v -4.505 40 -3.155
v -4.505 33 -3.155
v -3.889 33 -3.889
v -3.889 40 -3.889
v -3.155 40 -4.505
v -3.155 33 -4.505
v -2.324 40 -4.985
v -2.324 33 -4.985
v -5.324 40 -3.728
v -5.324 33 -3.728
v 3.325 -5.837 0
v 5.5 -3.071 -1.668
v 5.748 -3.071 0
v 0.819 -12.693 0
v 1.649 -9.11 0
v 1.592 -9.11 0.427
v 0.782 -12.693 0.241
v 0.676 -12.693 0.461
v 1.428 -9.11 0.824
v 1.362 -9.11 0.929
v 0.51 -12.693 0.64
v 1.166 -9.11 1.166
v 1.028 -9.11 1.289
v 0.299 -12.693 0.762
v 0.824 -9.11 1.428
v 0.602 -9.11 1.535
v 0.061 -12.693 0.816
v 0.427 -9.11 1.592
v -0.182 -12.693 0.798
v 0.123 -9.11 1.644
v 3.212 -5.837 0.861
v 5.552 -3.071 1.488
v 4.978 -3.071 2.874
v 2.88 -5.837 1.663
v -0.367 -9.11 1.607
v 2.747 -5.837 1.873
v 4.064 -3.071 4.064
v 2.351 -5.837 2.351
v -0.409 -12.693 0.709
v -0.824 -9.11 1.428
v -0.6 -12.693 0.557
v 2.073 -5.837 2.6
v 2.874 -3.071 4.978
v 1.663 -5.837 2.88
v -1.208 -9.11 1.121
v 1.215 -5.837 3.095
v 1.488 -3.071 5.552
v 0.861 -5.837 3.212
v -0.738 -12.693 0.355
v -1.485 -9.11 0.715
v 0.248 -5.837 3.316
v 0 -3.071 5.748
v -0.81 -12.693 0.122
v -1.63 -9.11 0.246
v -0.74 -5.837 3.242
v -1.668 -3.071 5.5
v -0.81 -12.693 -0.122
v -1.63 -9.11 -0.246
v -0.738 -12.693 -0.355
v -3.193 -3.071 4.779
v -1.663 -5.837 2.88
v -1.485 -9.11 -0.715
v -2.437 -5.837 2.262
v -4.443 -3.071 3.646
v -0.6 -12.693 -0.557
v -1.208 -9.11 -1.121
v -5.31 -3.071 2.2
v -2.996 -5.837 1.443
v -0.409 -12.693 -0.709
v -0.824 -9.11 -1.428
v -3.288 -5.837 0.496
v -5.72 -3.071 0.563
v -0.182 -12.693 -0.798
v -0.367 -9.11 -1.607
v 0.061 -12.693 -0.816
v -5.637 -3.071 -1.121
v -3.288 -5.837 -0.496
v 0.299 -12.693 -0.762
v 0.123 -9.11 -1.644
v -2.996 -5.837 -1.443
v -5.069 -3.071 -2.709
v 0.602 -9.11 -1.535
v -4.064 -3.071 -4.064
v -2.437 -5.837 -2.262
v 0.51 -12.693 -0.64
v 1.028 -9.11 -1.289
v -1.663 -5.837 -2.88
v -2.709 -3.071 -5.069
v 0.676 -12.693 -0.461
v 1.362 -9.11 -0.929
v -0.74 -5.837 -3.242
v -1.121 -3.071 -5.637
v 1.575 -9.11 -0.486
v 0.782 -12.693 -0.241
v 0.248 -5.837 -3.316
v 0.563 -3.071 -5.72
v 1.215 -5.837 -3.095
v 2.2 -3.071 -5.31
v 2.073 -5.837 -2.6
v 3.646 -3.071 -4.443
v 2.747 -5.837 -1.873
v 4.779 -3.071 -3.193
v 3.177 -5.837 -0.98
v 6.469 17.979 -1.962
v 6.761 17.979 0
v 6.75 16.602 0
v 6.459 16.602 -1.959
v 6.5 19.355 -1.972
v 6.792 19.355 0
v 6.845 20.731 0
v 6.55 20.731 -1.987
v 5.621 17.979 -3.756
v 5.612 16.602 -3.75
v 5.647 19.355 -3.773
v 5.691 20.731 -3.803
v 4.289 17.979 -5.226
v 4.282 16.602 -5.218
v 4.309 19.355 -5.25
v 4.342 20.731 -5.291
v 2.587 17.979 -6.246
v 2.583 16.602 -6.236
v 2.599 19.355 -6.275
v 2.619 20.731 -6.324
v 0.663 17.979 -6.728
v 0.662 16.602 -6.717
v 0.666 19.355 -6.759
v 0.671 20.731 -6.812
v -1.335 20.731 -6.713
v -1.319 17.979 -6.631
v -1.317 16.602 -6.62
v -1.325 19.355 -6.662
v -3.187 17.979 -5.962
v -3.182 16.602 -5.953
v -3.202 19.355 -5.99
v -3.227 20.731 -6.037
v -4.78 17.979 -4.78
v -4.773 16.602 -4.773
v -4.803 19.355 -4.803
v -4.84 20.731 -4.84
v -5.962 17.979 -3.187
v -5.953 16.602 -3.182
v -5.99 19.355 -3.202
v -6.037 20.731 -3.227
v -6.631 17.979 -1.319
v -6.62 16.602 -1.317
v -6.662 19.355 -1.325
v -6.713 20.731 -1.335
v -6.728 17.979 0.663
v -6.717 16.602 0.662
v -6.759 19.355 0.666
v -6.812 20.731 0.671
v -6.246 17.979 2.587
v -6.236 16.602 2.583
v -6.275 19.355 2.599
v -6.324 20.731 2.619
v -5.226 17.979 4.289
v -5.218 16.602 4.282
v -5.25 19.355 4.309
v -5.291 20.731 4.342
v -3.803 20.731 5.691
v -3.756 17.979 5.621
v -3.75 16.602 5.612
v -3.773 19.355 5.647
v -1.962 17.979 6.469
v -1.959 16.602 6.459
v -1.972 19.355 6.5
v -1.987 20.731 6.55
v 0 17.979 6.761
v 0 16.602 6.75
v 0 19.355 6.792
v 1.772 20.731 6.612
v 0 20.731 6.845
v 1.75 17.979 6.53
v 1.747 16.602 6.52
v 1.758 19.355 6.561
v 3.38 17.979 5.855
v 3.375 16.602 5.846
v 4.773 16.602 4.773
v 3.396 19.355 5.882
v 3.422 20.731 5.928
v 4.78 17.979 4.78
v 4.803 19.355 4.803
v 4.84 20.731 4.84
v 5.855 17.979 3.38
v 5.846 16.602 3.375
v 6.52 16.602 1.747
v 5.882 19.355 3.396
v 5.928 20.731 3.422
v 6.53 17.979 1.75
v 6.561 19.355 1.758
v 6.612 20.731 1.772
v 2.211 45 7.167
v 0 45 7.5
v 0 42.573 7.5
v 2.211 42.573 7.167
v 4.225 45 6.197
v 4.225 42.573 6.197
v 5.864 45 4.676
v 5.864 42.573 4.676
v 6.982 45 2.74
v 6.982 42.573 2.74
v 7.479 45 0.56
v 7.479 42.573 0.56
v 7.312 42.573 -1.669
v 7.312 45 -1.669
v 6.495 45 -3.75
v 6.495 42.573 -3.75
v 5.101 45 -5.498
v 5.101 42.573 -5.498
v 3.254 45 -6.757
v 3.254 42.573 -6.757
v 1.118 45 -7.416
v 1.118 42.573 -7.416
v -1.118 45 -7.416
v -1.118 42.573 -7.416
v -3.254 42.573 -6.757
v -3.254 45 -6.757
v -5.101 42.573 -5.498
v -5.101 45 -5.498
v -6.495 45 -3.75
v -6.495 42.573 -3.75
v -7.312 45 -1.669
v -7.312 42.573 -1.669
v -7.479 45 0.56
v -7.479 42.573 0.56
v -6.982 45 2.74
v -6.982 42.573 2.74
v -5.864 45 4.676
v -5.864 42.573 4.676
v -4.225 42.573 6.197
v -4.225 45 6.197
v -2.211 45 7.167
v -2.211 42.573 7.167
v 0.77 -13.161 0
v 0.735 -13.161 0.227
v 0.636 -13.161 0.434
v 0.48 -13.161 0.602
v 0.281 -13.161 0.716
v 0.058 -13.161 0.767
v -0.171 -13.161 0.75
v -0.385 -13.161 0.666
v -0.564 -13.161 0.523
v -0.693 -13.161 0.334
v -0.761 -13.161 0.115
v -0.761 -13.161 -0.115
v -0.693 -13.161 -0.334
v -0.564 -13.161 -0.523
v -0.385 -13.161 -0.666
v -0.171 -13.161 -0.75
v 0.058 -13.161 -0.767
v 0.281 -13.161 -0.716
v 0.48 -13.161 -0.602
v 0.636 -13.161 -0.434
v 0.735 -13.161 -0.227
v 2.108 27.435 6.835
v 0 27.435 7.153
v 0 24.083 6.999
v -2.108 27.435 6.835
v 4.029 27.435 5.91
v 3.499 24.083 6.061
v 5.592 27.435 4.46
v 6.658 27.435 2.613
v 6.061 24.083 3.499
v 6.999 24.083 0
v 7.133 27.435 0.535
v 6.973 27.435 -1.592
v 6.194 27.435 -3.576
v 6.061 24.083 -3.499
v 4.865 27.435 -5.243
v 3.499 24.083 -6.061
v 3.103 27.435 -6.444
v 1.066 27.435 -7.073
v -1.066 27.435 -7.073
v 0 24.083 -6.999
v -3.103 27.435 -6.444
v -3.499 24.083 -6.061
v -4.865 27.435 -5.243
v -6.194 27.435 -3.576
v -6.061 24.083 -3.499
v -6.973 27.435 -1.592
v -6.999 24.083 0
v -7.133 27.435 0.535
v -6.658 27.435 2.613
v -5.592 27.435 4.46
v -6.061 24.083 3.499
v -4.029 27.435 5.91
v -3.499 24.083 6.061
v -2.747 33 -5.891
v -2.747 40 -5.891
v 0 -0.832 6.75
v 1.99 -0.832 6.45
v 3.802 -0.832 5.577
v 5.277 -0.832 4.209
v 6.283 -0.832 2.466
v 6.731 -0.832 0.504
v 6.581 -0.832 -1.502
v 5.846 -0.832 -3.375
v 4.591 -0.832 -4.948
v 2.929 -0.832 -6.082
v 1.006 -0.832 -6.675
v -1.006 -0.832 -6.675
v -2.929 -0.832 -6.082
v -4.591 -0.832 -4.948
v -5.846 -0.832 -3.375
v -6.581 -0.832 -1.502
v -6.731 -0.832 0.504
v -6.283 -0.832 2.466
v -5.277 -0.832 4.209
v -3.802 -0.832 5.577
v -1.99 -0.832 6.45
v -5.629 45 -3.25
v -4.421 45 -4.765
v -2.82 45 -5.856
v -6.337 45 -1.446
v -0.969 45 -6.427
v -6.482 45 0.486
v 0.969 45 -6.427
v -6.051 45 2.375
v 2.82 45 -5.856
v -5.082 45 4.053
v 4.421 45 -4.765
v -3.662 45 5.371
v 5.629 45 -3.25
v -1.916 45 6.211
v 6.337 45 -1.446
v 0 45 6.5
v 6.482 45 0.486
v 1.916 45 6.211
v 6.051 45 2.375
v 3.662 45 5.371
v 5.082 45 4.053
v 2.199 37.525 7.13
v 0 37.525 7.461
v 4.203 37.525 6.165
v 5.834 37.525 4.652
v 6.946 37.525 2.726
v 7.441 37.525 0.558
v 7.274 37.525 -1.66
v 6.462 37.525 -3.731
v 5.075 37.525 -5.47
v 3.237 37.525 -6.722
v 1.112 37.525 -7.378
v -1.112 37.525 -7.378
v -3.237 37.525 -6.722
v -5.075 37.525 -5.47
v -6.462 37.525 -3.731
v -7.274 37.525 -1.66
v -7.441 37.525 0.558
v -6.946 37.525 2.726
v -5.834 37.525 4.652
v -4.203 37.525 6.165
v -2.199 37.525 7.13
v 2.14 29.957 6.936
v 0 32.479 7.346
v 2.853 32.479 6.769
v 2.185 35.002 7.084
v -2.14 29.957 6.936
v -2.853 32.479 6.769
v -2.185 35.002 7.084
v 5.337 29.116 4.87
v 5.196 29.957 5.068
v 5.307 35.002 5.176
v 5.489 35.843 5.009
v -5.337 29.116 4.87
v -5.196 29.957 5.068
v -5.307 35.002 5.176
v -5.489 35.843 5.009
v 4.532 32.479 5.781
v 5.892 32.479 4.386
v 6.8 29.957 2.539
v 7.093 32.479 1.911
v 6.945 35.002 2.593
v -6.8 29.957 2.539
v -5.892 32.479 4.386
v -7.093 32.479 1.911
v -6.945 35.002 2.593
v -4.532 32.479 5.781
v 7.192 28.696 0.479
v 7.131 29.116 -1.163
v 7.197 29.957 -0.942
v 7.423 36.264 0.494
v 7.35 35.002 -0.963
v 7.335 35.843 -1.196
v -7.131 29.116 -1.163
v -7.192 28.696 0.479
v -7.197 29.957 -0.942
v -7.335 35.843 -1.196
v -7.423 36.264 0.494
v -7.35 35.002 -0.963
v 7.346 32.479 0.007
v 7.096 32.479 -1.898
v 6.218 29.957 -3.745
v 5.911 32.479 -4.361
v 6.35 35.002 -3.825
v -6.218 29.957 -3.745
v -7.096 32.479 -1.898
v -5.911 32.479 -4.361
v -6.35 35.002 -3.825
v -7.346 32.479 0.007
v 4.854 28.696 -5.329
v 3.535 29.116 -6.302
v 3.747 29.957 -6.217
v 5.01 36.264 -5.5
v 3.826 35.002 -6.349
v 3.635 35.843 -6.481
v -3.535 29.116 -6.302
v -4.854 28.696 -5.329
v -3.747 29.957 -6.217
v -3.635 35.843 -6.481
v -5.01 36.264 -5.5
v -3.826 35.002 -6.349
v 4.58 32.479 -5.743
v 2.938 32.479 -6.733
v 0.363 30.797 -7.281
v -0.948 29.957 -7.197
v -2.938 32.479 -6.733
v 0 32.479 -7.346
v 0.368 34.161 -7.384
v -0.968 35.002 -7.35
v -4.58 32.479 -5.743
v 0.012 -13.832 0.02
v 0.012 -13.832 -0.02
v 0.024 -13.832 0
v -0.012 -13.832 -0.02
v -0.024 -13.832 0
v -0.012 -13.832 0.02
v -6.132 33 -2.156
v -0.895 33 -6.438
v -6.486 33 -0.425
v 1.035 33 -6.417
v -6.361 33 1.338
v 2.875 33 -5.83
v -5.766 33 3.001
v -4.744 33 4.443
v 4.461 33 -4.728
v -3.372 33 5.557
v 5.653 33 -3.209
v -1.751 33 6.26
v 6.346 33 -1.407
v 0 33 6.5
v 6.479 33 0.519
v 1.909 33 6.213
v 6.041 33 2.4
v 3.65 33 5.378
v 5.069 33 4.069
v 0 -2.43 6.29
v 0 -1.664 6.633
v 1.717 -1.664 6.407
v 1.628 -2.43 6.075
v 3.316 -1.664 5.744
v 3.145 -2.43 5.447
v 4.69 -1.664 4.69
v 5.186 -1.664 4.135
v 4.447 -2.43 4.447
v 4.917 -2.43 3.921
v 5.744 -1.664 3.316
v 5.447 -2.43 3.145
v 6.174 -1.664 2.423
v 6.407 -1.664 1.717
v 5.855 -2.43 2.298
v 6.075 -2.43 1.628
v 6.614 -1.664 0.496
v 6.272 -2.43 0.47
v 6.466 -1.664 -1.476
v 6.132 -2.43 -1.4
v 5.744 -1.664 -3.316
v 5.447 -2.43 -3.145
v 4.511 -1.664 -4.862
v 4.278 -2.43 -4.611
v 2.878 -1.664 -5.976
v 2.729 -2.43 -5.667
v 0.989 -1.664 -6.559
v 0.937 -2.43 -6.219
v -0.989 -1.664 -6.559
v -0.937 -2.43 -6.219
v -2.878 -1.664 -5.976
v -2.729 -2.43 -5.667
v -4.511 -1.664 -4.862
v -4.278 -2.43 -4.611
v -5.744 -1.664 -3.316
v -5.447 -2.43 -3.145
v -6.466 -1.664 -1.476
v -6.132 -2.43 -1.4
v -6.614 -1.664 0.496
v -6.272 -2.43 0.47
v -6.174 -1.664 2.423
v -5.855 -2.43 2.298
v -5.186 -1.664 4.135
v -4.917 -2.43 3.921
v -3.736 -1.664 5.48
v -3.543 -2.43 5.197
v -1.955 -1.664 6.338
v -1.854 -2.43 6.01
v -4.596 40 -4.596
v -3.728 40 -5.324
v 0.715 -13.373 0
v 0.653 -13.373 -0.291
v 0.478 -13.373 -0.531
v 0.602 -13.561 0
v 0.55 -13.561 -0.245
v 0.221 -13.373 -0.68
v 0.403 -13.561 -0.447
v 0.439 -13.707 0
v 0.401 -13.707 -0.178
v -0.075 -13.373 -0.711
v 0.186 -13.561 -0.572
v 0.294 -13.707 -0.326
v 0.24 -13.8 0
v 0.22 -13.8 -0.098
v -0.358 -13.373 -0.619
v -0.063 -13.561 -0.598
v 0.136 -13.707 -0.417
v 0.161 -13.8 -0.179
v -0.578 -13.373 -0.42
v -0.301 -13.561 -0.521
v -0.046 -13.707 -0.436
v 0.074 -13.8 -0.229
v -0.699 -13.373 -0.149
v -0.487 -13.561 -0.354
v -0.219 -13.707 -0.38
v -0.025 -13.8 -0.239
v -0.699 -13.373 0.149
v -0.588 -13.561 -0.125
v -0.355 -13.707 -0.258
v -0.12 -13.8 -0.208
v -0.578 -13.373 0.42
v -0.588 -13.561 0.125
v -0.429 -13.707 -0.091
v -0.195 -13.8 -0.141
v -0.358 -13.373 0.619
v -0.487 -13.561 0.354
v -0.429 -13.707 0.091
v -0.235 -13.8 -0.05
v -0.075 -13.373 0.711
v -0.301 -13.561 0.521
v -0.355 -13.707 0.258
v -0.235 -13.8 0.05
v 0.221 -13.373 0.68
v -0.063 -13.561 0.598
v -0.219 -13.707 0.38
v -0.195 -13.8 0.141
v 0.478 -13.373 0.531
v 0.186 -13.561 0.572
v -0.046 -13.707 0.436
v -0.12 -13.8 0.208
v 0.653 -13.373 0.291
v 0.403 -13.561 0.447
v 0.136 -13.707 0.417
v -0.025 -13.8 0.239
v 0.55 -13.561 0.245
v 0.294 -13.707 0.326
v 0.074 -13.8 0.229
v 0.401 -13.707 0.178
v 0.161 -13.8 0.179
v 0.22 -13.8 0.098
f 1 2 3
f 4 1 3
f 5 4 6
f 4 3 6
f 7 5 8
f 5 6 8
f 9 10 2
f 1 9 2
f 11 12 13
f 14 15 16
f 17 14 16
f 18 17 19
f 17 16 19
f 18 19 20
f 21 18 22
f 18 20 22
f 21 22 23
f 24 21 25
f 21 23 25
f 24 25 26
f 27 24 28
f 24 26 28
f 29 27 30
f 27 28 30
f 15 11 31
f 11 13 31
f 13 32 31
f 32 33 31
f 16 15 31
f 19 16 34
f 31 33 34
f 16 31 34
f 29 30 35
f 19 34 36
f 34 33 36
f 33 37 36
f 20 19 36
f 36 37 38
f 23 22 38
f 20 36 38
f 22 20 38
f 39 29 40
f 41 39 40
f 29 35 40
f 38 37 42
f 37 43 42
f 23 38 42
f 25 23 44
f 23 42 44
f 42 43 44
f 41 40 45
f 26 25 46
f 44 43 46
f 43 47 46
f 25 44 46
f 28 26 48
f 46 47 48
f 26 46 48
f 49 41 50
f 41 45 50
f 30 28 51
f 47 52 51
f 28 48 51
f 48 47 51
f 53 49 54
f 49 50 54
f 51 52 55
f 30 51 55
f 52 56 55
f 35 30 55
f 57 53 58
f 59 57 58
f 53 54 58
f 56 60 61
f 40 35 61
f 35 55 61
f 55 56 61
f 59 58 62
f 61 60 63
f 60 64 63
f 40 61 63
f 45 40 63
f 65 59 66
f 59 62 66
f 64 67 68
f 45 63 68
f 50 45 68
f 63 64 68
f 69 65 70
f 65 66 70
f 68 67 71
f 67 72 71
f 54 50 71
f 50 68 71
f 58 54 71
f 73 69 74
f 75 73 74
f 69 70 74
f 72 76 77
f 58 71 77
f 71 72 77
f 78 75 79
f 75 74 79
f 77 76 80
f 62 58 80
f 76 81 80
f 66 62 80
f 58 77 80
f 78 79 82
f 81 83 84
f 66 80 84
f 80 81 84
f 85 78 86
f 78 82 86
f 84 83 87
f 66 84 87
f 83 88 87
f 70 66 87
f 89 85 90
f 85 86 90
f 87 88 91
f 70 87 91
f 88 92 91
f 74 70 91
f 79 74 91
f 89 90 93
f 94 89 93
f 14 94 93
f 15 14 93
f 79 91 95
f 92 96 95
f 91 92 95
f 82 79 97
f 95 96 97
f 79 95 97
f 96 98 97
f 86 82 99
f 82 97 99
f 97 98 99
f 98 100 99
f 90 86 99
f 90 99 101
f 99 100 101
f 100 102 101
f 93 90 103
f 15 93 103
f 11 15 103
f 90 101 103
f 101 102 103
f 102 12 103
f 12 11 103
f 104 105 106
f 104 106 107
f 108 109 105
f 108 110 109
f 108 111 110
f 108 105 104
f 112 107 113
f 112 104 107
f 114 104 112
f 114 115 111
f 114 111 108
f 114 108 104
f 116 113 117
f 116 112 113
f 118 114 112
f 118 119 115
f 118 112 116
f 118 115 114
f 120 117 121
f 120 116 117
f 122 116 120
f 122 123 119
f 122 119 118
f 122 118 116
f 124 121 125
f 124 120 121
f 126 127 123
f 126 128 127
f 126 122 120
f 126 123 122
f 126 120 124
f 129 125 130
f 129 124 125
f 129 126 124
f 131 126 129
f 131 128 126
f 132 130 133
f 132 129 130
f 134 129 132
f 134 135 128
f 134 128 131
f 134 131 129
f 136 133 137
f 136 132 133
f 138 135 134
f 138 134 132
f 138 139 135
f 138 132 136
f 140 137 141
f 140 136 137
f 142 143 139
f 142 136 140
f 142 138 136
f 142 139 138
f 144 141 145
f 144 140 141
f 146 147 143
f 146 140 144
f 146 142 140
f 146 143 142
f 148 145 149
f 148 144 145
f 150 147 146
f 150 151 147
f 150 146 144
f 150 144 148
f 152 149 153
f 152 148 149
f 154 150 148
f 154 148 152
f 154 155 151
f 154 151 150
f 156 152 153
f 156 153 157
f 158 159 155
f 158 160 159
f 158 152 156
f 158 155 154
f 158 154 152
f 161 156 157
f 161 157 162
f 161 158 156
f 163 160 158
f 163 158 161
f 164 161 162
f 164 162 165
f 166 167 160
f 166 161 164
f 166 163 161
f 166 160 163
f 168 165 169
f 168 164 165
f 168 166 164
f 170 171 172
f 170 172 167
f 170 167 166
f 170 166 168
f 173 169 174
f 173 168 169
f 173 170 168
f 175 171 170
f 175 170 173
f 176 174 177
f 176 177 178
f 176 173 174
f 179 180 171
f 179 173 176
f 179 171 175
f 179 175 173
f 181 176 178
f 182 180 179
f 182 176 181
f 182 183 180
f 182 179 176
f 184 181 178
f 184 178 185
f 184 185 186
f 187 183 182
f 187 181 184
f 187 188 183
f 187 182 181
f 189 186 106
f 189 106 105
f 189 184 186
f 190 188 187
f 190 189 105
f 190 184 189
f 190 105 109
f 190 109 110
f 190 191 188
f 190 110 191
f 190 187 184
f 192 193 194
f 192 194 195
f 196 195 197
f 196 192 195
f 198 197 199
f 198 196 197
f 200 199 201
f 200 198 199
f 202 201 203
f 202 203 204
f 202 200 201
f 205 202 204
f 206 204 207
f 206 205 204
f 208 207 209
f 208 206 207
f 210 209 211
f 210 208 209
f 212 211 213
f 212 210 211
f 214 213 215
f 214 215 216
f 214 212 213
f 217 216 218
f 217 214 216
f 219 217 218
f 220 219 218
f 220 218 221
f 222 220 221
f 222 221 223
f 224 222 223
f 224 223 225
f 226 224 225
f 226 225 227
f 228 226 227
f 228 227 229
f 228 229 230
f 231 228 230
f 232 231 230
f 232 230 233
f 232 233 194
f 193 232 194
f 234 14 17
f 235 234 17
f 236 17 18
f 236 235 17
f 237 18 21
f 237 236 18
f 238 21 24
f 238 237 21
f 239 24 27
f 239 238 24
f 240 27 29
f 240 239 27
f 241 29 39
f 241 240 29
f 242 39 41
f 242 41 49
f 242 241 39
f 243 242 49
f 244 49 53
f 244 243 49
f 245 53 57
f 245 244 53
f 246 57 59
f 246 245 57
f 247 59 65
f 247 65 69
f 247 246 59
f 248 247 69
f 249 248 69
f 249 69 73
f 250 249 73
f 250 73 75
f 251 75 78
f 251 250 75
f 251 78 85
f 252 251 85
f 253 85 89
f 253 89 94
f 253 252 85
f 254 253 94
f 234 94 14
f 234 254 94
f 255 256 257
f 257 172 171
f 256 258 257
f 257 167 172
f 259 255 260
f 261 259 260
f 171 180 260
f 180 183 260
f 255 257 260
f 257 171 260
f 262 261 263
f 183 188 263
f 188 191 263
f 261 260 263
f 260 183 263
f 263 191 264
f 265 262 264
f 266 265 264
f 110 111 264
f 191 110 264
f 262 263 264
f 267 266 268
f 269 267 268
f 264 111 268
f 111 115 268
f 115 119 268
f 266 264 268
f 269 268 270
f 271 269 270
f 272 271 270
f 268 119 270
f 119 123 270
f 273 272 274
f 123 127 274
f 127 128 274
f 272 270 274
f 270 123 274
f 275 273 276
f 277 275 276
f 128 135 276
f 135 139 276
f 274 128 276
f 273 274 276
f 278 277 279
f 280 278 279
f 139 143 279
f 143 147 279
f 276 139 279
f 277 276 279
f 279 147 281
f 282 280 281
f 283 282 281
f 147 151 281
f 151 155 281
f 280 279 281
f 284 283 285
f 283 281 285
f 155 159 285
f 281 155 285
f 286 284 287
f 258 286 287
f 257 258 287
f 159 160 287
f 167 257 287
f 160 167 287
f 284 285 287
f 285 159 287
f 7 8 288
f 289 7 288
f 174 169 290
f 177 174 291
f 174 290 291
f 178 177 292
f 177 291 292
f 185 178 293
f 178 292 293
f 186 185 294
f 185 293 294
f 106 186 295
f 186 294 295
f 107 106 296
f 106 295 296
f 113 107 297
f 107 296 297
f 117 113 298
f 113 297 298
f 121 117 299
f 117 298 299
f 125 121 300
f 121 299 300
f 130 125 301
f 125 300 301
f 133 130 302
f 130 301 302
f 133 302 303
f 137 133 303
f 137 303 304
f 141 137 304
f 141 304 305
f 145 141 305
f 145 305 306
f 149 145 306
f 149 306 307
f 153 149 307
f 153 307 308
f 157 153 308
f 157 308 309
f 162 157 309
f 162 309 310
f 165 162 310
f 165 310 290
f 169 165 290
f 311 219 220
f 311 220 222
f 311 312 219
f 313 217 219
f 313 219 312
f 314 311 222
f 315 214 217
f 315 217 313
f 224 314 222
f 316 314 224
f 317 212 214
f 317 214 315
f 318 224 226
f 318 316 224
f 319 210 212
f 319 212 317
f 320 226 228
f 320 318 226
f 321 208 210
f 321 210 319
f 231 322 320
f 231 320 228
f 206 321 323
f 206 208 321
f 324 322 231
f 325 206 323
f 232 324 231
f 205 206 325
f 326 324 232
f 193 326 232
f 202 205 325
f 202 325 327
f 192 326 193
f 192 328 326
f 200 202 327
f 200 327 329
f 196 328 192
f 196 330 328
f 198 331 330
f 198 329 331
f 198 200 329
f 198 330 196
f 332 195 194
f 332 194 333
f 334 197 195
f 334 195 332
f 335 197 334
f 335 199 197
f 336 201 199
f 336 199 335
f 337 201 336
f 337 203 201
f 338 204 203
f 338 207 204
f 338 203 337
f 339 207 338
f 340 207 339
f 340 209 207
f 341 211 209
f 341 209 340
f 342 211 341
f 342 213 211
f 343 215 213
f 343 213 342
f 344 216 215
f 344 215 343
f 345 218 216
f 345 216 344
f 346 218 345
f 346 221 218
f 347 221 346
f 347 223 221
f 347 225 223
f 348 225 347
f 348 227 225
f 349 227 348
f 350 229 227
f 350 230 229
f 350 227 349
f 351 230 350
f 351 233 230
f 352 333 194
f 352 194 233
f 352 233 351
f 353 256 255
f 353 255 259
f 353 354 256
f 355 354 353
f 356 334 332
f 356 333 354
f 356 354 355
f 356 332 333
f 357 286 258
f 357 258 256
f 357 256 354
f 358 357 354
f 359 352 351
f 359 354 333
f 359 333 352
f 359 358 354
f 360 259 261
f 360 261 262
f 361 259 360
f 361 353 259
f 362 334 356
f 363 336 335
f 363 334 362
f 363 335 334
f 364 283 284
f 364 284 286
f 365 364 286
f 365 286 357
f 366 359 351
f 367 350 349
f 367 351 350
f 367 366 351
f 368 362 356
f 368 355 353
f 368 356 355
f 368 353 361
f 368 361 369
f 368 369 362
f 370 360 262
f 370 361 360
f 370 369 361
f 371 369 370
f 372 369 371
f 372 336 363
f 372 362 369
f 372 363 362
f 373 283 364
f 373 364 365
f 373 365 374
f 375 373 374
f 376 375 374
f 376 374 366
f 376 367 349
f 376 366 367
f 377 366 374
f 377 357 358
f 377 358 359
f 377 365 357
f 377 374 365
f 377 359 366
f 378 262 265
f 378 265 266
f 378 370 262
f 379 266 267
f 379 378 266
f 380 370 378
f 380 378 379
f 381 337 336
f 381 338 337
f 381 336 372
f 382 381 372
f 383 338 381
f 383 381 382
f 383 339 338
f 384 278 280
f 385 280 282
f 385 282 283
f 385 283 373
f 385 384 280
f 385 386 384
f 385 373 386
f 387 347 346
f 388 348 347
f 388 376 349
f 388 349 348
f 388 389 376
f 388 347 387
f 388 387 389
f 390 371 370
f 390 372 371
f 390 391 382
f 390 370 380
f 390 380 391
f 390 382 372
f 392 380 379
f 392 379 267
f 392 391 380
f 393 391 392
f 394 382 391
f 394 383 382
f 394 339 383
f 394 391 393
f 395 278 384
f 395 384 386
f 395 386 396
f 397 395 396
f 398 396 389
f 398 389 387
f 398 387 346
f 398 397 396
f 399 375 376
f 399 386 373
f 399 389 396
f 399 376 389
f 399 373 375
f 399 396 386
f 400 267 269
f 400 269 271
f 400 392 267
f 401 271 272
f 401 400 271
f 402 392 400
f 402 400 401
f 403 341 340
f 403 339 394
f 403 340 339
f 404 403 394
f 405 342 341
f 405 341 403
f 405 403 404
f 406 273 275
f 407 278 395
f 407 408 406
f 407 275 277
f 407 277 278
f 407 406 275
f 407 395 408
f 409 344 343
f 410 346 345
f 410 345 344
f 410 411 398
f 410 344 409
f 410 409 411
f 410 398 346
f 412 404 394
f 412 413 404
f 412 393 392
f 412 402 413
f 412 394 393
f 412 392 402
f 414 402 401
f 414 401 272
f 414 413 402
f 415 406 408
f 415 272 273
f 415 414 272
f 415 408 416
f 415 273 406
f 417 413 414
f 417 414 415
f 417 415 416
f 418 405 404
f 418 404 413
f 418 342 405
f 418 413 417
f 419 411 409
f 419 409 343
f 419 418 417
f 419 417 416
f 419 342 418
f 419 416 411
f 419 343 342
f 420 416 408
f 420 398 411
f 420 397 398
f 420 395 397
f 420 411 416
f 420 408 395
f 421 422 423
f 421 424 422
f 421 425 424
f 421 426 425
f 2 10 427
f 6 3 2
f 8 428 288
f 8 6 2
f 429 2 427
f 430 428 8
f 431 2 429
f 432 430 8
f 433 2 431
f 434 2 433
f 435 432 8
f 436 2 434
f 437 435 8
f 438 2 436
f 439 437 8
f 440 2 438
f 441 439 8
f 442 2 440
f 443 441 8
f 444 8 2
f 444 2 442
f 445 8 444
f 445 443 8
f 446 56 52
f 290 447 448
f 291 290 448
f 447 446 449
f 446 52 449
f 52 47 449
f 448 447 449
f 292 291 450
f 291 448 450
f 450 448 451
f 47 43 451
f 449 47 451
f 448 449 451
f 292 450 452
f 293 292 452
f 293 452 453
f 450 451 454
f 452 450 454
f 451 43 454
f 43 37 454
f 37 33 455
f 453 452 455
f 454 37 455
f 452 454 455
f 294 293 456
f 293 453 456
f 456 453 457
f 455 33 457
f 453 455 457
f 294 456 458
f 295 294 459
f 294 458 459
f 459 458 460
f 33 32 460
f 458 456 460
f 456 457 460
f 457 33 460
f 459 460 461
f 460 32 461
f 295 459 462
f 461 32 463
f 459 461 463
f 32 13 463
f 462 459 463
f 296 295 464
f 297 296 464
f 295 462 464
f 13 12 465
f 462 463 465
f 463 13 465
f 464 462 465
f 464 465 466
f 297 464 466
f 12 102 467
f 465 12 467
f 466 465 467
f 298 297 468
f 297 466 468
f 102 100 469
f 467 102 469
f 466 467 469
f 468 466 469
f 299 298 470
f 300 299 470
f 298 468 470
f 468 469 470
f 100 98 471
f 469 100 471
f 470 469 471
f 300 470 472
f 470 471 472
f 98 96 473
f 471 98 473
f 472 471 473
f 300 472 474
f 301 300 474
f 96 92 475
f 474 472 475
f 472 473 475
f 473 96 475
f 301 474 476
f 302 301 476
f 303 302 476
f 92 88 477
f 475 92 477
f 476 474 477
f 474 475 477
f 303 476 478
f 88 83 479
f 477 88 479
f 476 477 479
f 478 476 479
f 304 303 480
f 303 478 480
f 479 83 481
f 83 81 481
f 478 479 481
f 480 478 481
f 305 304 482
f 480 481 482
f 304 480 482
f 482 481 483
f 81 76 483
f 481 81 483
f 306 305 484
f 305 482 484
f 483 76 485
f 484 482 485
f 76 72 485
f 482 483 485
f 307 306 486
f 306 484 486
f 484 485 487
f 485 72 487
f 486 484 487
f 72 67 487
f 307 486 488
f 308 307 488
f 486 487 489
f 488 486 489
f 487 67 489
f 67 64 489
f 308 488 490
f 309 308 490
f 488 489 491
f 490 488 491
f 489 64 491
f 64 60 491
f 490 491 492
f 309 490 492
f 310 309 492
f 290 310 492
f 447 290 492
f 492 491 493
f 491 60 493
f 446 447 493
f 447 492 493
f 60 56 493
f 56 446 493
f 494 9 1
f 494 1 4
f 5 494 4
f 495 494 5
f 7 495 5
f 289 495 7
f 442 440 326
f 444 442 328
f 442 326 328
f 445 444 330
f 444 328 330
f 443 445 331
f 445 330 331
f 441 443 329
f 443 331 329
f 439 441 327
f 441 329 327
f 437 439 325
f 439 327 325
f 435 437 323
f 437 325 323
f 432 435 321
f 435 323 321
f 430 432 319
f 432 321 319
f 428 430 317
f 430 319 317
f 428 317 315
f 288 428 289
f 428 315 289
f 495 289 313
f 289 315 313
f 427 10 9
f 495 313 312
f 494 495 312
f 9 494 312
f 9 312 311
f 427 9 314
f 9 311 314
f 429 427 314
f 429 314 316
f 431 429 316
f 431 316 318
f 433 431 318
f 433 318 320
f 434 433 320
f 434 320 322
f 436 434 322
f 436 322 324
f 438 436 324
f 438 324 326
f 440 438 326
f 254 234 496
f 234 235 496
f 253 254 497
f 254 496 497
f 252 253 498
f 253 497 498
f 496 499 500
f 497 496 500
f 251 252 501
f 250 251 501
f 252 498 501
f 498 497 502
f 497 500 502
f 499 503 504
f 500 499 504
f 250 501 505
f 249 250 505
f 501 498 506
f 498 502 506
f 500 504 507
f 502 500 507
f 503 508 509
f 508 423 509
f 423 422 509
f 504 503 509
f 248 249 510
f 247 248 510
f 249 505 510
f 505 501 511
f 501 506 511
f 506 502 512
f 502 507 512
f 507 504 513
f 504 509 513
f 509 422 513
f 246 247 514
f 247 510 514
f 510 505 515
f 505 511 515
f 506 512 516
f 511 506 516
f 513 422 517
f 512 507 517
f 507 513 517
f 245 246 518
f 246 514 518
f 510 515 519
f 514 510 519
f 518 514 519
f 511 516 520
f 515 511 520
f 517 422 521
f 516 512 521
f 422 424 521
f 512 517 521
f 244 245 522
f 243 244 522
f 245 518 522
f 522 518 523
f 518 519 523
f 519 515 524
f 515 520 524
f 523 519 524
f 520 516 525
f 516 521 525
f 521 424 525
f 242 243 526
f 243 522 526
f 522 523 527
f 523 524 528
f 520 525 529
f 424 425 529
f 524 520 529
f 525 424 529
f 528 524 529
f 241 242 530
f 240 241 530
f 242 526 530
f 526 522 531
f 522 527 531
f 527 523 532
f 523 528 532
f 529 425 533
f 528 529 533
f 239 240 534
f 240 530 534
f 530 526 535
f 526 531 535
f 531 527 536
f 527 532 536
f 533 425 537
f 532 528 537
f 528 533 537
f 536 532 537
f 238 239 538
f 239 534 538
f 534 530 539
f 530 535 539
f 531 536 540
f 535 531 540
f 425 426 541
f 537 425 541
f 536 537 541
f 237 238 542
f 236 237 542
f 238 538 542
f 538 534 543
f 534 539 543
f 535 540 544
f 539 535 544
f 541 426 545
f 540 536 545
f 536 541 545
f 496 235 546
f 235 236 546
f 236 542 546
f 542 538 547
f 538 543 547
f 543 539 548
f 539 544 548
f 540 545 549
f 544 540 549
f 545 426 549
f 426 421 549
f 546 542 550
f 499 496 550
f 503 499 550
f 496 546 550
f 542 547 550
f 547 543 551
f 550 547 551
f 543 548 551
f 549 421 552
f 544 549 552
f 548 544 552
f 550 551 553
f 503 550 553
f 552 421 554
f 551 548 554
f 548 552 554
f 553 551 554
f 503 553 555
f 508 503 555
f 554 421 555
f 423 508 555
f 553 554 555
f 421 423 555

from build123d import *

# Parameters (mm, degrees)
SKETCH1_R           = 4.5
BOSS_EXTRUDE1_DEPTH = 15
FILLET1_R           = 2
SCALE1_SCALE        = 1.5
SKETCH5_R           = 7.5
BOSS_EXTRUDE4_DEPTH = 10
FILLET6_R           = 330
SKETCH6_R           = 6.5
CUT_EXTRUDE1_DEPTH  = 12
BOSS_EXTRUDE5_DEPTH = 7
SKETCH8_R           = 1.75
BOSS_EXTRUDE6_DEPTH = 10
BOSS_EXTRUDE6_TAPER = 6
FILLET8_R           = 0.75
FILLET9_R           = 15


with BuildPart() as part:
    # Sketch1 → Boss-Extrude1 (new body)
    with BuildSketch(Plane(origin=(0, 0, 0), x_dir=(1, 0, 0), z_dir=(0, 1, 0))):
        with Locations(Location((0, 0, 0), (0, 0, 270))):
            Circle(SKETCH1_R)
    extrude(amount=BOSS_EXTRUDE1_DEPTH)

    # Fillet1
    fillet1_edges = [part.edges().sort_by_distance(p)[0] for p in [
        (0, 0, -4.5),
    ]]
    fillet(fillet1_edges, radius=FILLET1_R)


with BuildPart() as part_1:
    # Scale1: scaled about (0, 7.664895453, 0)
    add(part.part.scale(SCALE1_SCALE).moved(Location((0, -3.832447726, 0))))


with BuildPart() as body_2:
    # Sketch5 → Boss-Extrude4 (new body)
    with BuildSketch(Plane(origin=(0, 45, 0), x_dir=(1, 0, 0), z_dir=(0, 1, 0))):
        with Locations(Location((0, 0, 0), (0, 0, 270))):
            Circle(SKETCH5_R)
    extrude(amount=-BOSS_EXTRUDE4_DEPTH)


    add(part_1.part)  # loft1 joins it to this body
    # loft from a face of the part (loft1)
    loft([body_2.faces().sort_by_distance((0, 35, 0))[0], body_2.faces().sort_by_distance((0, 18.667552274, 0))[0]])

    # Fillet6
    # the kernel refuses this fillet: 330 mm, written as the material it takes off along each edge
    with BuildSketch(Plane(origin=(0, 35, 0), x_dir=(0, 0, 1), z_dir=(-1, 0, 0))) as fillet6_piece_1:
        with BuildLine():
            CenterArc((7.5 - FILLET6_R, FILLET6_R * 0.0229483370442), FILLET6_R, 357.370775756, 2.629224244)
            Line((7.5, FILLET6_R * 0.0229483370442), (7.5, 0))
            Line((7.5, 0), (7.5 - FILLET6_R * 0.00105269796789, -FILLET6_R * 0.0229241793765))
        make_face()
    revolve(axis=Axis((0, 35, 0), (0, 1, 0)), mode=Mode.SUBTRACT)

    # Fillet7: read off the stored shape, not the designer's step
    # Fillet7 outline → Fillet7 (revolve)
    with BuildSketch(Plane.XY):
        with BuildLine():
            ThreePointArc((6.75, 16.602201939), (6.773688822, 18.667008654), (6.844742817, 20.730728417))
            Line((6.844742817, 20.730728417), (6.75, 20.730728417))
            Line((6.75, 20.730728417), (6.75, 16.602201939))
        make_face()
    revolve(axis=Axis((0, 0, 0), (0, 1, 0)))

    # Sketch6 → Cut-Extrude1 (cut)
    with BuildSketch(Plane(origin=(0, 45, 0), x_dir=(1, 0, 0), z_dir=(0, 1, 0))):
        with Locations(Location((0, 0, 0), (0, 0, 270))):
            Circle(SKETCH6_R)
    extrude(amount=-CUT_EXTRUDE1_DEPTH, mode=Mode.SUBTRACT)

    # Sketch7 → Boss-Extrude5 (add)
    with BuildSketch(Plane(origin=(0, 33, 0), x_dir=(1, 0, 0), z_dir=(0, 1, 0))):
        with BuildLine():
            Line((-5.324488288, 3.728246836), (-4.505336244, 3.1546704))
            ThreePointArc((-4.505336244, 3.1546704), (-3.535331853, 4.213244437), (-2.32440044, 4.984692829))
            Line((-2.32440044, 4.984692829), (-2.747018701, 5.891000616))
            ThreePointArc((-2.747018701, 5.891000616), (-4.178119463, 4.97928888), (-5.324488288, 3.728246836))
        make_face()
    extrude(amount=BOSS_EXTRUDE5_DEPTH)

    # Sketch8 → Boss-Extrude6 (add)
    with BuildSketch(Plane.XZ.offset(3.832447727)):
        Circle(SKETCH8_R)
    extrude(amount=BOSS_EXTRUDE6_DEPTH, taper=BOSS_EXTRUDE6_TAPER)

    # Fillet8
    fillet8_edges = [body_2.edges().sort_by_distance(p)[0] for p in [
        (-0.698957647, -13.832447727, 0),
    ]]
    fillet(fillet8_edges, radius=FILLET8_R)

    # Fillet9
    # the kernel refuses this fillet: 15 mm, written as the material it adds along each edge
    with BuildSketch(Plane(origin=(0, -3.832447727, 0), x_dir=(1, 0, 0), z_dir=(0, 0, -1))) as fillet9_piece_1:
        with BuildLine():
            CenterArc((15.736552733, 10.428423347), FILLET9_R, 186, 42.247086963)
            Line((5.747758789, -0.761929442), (4.748879394, -1.880964721))
            ThreePointArc((4.748879394, -1.880964721), (3.75, -1.5), (1.75, -1.5))
            Line((1.75, -1.5), (0.258217157, -0.156792695))
            Line((0.258217157, -0.156792695), (0, 2.299979445))
            Line((0, 2.299979445), (0, 8.774445006))
            Line((0, 8.774445006), (0.818724302, 8.860496398))
        make_face()
    revolve(axis=Axis((0, -3.832447727, 0), (0, -1, 0)))


solid = body_2.part
